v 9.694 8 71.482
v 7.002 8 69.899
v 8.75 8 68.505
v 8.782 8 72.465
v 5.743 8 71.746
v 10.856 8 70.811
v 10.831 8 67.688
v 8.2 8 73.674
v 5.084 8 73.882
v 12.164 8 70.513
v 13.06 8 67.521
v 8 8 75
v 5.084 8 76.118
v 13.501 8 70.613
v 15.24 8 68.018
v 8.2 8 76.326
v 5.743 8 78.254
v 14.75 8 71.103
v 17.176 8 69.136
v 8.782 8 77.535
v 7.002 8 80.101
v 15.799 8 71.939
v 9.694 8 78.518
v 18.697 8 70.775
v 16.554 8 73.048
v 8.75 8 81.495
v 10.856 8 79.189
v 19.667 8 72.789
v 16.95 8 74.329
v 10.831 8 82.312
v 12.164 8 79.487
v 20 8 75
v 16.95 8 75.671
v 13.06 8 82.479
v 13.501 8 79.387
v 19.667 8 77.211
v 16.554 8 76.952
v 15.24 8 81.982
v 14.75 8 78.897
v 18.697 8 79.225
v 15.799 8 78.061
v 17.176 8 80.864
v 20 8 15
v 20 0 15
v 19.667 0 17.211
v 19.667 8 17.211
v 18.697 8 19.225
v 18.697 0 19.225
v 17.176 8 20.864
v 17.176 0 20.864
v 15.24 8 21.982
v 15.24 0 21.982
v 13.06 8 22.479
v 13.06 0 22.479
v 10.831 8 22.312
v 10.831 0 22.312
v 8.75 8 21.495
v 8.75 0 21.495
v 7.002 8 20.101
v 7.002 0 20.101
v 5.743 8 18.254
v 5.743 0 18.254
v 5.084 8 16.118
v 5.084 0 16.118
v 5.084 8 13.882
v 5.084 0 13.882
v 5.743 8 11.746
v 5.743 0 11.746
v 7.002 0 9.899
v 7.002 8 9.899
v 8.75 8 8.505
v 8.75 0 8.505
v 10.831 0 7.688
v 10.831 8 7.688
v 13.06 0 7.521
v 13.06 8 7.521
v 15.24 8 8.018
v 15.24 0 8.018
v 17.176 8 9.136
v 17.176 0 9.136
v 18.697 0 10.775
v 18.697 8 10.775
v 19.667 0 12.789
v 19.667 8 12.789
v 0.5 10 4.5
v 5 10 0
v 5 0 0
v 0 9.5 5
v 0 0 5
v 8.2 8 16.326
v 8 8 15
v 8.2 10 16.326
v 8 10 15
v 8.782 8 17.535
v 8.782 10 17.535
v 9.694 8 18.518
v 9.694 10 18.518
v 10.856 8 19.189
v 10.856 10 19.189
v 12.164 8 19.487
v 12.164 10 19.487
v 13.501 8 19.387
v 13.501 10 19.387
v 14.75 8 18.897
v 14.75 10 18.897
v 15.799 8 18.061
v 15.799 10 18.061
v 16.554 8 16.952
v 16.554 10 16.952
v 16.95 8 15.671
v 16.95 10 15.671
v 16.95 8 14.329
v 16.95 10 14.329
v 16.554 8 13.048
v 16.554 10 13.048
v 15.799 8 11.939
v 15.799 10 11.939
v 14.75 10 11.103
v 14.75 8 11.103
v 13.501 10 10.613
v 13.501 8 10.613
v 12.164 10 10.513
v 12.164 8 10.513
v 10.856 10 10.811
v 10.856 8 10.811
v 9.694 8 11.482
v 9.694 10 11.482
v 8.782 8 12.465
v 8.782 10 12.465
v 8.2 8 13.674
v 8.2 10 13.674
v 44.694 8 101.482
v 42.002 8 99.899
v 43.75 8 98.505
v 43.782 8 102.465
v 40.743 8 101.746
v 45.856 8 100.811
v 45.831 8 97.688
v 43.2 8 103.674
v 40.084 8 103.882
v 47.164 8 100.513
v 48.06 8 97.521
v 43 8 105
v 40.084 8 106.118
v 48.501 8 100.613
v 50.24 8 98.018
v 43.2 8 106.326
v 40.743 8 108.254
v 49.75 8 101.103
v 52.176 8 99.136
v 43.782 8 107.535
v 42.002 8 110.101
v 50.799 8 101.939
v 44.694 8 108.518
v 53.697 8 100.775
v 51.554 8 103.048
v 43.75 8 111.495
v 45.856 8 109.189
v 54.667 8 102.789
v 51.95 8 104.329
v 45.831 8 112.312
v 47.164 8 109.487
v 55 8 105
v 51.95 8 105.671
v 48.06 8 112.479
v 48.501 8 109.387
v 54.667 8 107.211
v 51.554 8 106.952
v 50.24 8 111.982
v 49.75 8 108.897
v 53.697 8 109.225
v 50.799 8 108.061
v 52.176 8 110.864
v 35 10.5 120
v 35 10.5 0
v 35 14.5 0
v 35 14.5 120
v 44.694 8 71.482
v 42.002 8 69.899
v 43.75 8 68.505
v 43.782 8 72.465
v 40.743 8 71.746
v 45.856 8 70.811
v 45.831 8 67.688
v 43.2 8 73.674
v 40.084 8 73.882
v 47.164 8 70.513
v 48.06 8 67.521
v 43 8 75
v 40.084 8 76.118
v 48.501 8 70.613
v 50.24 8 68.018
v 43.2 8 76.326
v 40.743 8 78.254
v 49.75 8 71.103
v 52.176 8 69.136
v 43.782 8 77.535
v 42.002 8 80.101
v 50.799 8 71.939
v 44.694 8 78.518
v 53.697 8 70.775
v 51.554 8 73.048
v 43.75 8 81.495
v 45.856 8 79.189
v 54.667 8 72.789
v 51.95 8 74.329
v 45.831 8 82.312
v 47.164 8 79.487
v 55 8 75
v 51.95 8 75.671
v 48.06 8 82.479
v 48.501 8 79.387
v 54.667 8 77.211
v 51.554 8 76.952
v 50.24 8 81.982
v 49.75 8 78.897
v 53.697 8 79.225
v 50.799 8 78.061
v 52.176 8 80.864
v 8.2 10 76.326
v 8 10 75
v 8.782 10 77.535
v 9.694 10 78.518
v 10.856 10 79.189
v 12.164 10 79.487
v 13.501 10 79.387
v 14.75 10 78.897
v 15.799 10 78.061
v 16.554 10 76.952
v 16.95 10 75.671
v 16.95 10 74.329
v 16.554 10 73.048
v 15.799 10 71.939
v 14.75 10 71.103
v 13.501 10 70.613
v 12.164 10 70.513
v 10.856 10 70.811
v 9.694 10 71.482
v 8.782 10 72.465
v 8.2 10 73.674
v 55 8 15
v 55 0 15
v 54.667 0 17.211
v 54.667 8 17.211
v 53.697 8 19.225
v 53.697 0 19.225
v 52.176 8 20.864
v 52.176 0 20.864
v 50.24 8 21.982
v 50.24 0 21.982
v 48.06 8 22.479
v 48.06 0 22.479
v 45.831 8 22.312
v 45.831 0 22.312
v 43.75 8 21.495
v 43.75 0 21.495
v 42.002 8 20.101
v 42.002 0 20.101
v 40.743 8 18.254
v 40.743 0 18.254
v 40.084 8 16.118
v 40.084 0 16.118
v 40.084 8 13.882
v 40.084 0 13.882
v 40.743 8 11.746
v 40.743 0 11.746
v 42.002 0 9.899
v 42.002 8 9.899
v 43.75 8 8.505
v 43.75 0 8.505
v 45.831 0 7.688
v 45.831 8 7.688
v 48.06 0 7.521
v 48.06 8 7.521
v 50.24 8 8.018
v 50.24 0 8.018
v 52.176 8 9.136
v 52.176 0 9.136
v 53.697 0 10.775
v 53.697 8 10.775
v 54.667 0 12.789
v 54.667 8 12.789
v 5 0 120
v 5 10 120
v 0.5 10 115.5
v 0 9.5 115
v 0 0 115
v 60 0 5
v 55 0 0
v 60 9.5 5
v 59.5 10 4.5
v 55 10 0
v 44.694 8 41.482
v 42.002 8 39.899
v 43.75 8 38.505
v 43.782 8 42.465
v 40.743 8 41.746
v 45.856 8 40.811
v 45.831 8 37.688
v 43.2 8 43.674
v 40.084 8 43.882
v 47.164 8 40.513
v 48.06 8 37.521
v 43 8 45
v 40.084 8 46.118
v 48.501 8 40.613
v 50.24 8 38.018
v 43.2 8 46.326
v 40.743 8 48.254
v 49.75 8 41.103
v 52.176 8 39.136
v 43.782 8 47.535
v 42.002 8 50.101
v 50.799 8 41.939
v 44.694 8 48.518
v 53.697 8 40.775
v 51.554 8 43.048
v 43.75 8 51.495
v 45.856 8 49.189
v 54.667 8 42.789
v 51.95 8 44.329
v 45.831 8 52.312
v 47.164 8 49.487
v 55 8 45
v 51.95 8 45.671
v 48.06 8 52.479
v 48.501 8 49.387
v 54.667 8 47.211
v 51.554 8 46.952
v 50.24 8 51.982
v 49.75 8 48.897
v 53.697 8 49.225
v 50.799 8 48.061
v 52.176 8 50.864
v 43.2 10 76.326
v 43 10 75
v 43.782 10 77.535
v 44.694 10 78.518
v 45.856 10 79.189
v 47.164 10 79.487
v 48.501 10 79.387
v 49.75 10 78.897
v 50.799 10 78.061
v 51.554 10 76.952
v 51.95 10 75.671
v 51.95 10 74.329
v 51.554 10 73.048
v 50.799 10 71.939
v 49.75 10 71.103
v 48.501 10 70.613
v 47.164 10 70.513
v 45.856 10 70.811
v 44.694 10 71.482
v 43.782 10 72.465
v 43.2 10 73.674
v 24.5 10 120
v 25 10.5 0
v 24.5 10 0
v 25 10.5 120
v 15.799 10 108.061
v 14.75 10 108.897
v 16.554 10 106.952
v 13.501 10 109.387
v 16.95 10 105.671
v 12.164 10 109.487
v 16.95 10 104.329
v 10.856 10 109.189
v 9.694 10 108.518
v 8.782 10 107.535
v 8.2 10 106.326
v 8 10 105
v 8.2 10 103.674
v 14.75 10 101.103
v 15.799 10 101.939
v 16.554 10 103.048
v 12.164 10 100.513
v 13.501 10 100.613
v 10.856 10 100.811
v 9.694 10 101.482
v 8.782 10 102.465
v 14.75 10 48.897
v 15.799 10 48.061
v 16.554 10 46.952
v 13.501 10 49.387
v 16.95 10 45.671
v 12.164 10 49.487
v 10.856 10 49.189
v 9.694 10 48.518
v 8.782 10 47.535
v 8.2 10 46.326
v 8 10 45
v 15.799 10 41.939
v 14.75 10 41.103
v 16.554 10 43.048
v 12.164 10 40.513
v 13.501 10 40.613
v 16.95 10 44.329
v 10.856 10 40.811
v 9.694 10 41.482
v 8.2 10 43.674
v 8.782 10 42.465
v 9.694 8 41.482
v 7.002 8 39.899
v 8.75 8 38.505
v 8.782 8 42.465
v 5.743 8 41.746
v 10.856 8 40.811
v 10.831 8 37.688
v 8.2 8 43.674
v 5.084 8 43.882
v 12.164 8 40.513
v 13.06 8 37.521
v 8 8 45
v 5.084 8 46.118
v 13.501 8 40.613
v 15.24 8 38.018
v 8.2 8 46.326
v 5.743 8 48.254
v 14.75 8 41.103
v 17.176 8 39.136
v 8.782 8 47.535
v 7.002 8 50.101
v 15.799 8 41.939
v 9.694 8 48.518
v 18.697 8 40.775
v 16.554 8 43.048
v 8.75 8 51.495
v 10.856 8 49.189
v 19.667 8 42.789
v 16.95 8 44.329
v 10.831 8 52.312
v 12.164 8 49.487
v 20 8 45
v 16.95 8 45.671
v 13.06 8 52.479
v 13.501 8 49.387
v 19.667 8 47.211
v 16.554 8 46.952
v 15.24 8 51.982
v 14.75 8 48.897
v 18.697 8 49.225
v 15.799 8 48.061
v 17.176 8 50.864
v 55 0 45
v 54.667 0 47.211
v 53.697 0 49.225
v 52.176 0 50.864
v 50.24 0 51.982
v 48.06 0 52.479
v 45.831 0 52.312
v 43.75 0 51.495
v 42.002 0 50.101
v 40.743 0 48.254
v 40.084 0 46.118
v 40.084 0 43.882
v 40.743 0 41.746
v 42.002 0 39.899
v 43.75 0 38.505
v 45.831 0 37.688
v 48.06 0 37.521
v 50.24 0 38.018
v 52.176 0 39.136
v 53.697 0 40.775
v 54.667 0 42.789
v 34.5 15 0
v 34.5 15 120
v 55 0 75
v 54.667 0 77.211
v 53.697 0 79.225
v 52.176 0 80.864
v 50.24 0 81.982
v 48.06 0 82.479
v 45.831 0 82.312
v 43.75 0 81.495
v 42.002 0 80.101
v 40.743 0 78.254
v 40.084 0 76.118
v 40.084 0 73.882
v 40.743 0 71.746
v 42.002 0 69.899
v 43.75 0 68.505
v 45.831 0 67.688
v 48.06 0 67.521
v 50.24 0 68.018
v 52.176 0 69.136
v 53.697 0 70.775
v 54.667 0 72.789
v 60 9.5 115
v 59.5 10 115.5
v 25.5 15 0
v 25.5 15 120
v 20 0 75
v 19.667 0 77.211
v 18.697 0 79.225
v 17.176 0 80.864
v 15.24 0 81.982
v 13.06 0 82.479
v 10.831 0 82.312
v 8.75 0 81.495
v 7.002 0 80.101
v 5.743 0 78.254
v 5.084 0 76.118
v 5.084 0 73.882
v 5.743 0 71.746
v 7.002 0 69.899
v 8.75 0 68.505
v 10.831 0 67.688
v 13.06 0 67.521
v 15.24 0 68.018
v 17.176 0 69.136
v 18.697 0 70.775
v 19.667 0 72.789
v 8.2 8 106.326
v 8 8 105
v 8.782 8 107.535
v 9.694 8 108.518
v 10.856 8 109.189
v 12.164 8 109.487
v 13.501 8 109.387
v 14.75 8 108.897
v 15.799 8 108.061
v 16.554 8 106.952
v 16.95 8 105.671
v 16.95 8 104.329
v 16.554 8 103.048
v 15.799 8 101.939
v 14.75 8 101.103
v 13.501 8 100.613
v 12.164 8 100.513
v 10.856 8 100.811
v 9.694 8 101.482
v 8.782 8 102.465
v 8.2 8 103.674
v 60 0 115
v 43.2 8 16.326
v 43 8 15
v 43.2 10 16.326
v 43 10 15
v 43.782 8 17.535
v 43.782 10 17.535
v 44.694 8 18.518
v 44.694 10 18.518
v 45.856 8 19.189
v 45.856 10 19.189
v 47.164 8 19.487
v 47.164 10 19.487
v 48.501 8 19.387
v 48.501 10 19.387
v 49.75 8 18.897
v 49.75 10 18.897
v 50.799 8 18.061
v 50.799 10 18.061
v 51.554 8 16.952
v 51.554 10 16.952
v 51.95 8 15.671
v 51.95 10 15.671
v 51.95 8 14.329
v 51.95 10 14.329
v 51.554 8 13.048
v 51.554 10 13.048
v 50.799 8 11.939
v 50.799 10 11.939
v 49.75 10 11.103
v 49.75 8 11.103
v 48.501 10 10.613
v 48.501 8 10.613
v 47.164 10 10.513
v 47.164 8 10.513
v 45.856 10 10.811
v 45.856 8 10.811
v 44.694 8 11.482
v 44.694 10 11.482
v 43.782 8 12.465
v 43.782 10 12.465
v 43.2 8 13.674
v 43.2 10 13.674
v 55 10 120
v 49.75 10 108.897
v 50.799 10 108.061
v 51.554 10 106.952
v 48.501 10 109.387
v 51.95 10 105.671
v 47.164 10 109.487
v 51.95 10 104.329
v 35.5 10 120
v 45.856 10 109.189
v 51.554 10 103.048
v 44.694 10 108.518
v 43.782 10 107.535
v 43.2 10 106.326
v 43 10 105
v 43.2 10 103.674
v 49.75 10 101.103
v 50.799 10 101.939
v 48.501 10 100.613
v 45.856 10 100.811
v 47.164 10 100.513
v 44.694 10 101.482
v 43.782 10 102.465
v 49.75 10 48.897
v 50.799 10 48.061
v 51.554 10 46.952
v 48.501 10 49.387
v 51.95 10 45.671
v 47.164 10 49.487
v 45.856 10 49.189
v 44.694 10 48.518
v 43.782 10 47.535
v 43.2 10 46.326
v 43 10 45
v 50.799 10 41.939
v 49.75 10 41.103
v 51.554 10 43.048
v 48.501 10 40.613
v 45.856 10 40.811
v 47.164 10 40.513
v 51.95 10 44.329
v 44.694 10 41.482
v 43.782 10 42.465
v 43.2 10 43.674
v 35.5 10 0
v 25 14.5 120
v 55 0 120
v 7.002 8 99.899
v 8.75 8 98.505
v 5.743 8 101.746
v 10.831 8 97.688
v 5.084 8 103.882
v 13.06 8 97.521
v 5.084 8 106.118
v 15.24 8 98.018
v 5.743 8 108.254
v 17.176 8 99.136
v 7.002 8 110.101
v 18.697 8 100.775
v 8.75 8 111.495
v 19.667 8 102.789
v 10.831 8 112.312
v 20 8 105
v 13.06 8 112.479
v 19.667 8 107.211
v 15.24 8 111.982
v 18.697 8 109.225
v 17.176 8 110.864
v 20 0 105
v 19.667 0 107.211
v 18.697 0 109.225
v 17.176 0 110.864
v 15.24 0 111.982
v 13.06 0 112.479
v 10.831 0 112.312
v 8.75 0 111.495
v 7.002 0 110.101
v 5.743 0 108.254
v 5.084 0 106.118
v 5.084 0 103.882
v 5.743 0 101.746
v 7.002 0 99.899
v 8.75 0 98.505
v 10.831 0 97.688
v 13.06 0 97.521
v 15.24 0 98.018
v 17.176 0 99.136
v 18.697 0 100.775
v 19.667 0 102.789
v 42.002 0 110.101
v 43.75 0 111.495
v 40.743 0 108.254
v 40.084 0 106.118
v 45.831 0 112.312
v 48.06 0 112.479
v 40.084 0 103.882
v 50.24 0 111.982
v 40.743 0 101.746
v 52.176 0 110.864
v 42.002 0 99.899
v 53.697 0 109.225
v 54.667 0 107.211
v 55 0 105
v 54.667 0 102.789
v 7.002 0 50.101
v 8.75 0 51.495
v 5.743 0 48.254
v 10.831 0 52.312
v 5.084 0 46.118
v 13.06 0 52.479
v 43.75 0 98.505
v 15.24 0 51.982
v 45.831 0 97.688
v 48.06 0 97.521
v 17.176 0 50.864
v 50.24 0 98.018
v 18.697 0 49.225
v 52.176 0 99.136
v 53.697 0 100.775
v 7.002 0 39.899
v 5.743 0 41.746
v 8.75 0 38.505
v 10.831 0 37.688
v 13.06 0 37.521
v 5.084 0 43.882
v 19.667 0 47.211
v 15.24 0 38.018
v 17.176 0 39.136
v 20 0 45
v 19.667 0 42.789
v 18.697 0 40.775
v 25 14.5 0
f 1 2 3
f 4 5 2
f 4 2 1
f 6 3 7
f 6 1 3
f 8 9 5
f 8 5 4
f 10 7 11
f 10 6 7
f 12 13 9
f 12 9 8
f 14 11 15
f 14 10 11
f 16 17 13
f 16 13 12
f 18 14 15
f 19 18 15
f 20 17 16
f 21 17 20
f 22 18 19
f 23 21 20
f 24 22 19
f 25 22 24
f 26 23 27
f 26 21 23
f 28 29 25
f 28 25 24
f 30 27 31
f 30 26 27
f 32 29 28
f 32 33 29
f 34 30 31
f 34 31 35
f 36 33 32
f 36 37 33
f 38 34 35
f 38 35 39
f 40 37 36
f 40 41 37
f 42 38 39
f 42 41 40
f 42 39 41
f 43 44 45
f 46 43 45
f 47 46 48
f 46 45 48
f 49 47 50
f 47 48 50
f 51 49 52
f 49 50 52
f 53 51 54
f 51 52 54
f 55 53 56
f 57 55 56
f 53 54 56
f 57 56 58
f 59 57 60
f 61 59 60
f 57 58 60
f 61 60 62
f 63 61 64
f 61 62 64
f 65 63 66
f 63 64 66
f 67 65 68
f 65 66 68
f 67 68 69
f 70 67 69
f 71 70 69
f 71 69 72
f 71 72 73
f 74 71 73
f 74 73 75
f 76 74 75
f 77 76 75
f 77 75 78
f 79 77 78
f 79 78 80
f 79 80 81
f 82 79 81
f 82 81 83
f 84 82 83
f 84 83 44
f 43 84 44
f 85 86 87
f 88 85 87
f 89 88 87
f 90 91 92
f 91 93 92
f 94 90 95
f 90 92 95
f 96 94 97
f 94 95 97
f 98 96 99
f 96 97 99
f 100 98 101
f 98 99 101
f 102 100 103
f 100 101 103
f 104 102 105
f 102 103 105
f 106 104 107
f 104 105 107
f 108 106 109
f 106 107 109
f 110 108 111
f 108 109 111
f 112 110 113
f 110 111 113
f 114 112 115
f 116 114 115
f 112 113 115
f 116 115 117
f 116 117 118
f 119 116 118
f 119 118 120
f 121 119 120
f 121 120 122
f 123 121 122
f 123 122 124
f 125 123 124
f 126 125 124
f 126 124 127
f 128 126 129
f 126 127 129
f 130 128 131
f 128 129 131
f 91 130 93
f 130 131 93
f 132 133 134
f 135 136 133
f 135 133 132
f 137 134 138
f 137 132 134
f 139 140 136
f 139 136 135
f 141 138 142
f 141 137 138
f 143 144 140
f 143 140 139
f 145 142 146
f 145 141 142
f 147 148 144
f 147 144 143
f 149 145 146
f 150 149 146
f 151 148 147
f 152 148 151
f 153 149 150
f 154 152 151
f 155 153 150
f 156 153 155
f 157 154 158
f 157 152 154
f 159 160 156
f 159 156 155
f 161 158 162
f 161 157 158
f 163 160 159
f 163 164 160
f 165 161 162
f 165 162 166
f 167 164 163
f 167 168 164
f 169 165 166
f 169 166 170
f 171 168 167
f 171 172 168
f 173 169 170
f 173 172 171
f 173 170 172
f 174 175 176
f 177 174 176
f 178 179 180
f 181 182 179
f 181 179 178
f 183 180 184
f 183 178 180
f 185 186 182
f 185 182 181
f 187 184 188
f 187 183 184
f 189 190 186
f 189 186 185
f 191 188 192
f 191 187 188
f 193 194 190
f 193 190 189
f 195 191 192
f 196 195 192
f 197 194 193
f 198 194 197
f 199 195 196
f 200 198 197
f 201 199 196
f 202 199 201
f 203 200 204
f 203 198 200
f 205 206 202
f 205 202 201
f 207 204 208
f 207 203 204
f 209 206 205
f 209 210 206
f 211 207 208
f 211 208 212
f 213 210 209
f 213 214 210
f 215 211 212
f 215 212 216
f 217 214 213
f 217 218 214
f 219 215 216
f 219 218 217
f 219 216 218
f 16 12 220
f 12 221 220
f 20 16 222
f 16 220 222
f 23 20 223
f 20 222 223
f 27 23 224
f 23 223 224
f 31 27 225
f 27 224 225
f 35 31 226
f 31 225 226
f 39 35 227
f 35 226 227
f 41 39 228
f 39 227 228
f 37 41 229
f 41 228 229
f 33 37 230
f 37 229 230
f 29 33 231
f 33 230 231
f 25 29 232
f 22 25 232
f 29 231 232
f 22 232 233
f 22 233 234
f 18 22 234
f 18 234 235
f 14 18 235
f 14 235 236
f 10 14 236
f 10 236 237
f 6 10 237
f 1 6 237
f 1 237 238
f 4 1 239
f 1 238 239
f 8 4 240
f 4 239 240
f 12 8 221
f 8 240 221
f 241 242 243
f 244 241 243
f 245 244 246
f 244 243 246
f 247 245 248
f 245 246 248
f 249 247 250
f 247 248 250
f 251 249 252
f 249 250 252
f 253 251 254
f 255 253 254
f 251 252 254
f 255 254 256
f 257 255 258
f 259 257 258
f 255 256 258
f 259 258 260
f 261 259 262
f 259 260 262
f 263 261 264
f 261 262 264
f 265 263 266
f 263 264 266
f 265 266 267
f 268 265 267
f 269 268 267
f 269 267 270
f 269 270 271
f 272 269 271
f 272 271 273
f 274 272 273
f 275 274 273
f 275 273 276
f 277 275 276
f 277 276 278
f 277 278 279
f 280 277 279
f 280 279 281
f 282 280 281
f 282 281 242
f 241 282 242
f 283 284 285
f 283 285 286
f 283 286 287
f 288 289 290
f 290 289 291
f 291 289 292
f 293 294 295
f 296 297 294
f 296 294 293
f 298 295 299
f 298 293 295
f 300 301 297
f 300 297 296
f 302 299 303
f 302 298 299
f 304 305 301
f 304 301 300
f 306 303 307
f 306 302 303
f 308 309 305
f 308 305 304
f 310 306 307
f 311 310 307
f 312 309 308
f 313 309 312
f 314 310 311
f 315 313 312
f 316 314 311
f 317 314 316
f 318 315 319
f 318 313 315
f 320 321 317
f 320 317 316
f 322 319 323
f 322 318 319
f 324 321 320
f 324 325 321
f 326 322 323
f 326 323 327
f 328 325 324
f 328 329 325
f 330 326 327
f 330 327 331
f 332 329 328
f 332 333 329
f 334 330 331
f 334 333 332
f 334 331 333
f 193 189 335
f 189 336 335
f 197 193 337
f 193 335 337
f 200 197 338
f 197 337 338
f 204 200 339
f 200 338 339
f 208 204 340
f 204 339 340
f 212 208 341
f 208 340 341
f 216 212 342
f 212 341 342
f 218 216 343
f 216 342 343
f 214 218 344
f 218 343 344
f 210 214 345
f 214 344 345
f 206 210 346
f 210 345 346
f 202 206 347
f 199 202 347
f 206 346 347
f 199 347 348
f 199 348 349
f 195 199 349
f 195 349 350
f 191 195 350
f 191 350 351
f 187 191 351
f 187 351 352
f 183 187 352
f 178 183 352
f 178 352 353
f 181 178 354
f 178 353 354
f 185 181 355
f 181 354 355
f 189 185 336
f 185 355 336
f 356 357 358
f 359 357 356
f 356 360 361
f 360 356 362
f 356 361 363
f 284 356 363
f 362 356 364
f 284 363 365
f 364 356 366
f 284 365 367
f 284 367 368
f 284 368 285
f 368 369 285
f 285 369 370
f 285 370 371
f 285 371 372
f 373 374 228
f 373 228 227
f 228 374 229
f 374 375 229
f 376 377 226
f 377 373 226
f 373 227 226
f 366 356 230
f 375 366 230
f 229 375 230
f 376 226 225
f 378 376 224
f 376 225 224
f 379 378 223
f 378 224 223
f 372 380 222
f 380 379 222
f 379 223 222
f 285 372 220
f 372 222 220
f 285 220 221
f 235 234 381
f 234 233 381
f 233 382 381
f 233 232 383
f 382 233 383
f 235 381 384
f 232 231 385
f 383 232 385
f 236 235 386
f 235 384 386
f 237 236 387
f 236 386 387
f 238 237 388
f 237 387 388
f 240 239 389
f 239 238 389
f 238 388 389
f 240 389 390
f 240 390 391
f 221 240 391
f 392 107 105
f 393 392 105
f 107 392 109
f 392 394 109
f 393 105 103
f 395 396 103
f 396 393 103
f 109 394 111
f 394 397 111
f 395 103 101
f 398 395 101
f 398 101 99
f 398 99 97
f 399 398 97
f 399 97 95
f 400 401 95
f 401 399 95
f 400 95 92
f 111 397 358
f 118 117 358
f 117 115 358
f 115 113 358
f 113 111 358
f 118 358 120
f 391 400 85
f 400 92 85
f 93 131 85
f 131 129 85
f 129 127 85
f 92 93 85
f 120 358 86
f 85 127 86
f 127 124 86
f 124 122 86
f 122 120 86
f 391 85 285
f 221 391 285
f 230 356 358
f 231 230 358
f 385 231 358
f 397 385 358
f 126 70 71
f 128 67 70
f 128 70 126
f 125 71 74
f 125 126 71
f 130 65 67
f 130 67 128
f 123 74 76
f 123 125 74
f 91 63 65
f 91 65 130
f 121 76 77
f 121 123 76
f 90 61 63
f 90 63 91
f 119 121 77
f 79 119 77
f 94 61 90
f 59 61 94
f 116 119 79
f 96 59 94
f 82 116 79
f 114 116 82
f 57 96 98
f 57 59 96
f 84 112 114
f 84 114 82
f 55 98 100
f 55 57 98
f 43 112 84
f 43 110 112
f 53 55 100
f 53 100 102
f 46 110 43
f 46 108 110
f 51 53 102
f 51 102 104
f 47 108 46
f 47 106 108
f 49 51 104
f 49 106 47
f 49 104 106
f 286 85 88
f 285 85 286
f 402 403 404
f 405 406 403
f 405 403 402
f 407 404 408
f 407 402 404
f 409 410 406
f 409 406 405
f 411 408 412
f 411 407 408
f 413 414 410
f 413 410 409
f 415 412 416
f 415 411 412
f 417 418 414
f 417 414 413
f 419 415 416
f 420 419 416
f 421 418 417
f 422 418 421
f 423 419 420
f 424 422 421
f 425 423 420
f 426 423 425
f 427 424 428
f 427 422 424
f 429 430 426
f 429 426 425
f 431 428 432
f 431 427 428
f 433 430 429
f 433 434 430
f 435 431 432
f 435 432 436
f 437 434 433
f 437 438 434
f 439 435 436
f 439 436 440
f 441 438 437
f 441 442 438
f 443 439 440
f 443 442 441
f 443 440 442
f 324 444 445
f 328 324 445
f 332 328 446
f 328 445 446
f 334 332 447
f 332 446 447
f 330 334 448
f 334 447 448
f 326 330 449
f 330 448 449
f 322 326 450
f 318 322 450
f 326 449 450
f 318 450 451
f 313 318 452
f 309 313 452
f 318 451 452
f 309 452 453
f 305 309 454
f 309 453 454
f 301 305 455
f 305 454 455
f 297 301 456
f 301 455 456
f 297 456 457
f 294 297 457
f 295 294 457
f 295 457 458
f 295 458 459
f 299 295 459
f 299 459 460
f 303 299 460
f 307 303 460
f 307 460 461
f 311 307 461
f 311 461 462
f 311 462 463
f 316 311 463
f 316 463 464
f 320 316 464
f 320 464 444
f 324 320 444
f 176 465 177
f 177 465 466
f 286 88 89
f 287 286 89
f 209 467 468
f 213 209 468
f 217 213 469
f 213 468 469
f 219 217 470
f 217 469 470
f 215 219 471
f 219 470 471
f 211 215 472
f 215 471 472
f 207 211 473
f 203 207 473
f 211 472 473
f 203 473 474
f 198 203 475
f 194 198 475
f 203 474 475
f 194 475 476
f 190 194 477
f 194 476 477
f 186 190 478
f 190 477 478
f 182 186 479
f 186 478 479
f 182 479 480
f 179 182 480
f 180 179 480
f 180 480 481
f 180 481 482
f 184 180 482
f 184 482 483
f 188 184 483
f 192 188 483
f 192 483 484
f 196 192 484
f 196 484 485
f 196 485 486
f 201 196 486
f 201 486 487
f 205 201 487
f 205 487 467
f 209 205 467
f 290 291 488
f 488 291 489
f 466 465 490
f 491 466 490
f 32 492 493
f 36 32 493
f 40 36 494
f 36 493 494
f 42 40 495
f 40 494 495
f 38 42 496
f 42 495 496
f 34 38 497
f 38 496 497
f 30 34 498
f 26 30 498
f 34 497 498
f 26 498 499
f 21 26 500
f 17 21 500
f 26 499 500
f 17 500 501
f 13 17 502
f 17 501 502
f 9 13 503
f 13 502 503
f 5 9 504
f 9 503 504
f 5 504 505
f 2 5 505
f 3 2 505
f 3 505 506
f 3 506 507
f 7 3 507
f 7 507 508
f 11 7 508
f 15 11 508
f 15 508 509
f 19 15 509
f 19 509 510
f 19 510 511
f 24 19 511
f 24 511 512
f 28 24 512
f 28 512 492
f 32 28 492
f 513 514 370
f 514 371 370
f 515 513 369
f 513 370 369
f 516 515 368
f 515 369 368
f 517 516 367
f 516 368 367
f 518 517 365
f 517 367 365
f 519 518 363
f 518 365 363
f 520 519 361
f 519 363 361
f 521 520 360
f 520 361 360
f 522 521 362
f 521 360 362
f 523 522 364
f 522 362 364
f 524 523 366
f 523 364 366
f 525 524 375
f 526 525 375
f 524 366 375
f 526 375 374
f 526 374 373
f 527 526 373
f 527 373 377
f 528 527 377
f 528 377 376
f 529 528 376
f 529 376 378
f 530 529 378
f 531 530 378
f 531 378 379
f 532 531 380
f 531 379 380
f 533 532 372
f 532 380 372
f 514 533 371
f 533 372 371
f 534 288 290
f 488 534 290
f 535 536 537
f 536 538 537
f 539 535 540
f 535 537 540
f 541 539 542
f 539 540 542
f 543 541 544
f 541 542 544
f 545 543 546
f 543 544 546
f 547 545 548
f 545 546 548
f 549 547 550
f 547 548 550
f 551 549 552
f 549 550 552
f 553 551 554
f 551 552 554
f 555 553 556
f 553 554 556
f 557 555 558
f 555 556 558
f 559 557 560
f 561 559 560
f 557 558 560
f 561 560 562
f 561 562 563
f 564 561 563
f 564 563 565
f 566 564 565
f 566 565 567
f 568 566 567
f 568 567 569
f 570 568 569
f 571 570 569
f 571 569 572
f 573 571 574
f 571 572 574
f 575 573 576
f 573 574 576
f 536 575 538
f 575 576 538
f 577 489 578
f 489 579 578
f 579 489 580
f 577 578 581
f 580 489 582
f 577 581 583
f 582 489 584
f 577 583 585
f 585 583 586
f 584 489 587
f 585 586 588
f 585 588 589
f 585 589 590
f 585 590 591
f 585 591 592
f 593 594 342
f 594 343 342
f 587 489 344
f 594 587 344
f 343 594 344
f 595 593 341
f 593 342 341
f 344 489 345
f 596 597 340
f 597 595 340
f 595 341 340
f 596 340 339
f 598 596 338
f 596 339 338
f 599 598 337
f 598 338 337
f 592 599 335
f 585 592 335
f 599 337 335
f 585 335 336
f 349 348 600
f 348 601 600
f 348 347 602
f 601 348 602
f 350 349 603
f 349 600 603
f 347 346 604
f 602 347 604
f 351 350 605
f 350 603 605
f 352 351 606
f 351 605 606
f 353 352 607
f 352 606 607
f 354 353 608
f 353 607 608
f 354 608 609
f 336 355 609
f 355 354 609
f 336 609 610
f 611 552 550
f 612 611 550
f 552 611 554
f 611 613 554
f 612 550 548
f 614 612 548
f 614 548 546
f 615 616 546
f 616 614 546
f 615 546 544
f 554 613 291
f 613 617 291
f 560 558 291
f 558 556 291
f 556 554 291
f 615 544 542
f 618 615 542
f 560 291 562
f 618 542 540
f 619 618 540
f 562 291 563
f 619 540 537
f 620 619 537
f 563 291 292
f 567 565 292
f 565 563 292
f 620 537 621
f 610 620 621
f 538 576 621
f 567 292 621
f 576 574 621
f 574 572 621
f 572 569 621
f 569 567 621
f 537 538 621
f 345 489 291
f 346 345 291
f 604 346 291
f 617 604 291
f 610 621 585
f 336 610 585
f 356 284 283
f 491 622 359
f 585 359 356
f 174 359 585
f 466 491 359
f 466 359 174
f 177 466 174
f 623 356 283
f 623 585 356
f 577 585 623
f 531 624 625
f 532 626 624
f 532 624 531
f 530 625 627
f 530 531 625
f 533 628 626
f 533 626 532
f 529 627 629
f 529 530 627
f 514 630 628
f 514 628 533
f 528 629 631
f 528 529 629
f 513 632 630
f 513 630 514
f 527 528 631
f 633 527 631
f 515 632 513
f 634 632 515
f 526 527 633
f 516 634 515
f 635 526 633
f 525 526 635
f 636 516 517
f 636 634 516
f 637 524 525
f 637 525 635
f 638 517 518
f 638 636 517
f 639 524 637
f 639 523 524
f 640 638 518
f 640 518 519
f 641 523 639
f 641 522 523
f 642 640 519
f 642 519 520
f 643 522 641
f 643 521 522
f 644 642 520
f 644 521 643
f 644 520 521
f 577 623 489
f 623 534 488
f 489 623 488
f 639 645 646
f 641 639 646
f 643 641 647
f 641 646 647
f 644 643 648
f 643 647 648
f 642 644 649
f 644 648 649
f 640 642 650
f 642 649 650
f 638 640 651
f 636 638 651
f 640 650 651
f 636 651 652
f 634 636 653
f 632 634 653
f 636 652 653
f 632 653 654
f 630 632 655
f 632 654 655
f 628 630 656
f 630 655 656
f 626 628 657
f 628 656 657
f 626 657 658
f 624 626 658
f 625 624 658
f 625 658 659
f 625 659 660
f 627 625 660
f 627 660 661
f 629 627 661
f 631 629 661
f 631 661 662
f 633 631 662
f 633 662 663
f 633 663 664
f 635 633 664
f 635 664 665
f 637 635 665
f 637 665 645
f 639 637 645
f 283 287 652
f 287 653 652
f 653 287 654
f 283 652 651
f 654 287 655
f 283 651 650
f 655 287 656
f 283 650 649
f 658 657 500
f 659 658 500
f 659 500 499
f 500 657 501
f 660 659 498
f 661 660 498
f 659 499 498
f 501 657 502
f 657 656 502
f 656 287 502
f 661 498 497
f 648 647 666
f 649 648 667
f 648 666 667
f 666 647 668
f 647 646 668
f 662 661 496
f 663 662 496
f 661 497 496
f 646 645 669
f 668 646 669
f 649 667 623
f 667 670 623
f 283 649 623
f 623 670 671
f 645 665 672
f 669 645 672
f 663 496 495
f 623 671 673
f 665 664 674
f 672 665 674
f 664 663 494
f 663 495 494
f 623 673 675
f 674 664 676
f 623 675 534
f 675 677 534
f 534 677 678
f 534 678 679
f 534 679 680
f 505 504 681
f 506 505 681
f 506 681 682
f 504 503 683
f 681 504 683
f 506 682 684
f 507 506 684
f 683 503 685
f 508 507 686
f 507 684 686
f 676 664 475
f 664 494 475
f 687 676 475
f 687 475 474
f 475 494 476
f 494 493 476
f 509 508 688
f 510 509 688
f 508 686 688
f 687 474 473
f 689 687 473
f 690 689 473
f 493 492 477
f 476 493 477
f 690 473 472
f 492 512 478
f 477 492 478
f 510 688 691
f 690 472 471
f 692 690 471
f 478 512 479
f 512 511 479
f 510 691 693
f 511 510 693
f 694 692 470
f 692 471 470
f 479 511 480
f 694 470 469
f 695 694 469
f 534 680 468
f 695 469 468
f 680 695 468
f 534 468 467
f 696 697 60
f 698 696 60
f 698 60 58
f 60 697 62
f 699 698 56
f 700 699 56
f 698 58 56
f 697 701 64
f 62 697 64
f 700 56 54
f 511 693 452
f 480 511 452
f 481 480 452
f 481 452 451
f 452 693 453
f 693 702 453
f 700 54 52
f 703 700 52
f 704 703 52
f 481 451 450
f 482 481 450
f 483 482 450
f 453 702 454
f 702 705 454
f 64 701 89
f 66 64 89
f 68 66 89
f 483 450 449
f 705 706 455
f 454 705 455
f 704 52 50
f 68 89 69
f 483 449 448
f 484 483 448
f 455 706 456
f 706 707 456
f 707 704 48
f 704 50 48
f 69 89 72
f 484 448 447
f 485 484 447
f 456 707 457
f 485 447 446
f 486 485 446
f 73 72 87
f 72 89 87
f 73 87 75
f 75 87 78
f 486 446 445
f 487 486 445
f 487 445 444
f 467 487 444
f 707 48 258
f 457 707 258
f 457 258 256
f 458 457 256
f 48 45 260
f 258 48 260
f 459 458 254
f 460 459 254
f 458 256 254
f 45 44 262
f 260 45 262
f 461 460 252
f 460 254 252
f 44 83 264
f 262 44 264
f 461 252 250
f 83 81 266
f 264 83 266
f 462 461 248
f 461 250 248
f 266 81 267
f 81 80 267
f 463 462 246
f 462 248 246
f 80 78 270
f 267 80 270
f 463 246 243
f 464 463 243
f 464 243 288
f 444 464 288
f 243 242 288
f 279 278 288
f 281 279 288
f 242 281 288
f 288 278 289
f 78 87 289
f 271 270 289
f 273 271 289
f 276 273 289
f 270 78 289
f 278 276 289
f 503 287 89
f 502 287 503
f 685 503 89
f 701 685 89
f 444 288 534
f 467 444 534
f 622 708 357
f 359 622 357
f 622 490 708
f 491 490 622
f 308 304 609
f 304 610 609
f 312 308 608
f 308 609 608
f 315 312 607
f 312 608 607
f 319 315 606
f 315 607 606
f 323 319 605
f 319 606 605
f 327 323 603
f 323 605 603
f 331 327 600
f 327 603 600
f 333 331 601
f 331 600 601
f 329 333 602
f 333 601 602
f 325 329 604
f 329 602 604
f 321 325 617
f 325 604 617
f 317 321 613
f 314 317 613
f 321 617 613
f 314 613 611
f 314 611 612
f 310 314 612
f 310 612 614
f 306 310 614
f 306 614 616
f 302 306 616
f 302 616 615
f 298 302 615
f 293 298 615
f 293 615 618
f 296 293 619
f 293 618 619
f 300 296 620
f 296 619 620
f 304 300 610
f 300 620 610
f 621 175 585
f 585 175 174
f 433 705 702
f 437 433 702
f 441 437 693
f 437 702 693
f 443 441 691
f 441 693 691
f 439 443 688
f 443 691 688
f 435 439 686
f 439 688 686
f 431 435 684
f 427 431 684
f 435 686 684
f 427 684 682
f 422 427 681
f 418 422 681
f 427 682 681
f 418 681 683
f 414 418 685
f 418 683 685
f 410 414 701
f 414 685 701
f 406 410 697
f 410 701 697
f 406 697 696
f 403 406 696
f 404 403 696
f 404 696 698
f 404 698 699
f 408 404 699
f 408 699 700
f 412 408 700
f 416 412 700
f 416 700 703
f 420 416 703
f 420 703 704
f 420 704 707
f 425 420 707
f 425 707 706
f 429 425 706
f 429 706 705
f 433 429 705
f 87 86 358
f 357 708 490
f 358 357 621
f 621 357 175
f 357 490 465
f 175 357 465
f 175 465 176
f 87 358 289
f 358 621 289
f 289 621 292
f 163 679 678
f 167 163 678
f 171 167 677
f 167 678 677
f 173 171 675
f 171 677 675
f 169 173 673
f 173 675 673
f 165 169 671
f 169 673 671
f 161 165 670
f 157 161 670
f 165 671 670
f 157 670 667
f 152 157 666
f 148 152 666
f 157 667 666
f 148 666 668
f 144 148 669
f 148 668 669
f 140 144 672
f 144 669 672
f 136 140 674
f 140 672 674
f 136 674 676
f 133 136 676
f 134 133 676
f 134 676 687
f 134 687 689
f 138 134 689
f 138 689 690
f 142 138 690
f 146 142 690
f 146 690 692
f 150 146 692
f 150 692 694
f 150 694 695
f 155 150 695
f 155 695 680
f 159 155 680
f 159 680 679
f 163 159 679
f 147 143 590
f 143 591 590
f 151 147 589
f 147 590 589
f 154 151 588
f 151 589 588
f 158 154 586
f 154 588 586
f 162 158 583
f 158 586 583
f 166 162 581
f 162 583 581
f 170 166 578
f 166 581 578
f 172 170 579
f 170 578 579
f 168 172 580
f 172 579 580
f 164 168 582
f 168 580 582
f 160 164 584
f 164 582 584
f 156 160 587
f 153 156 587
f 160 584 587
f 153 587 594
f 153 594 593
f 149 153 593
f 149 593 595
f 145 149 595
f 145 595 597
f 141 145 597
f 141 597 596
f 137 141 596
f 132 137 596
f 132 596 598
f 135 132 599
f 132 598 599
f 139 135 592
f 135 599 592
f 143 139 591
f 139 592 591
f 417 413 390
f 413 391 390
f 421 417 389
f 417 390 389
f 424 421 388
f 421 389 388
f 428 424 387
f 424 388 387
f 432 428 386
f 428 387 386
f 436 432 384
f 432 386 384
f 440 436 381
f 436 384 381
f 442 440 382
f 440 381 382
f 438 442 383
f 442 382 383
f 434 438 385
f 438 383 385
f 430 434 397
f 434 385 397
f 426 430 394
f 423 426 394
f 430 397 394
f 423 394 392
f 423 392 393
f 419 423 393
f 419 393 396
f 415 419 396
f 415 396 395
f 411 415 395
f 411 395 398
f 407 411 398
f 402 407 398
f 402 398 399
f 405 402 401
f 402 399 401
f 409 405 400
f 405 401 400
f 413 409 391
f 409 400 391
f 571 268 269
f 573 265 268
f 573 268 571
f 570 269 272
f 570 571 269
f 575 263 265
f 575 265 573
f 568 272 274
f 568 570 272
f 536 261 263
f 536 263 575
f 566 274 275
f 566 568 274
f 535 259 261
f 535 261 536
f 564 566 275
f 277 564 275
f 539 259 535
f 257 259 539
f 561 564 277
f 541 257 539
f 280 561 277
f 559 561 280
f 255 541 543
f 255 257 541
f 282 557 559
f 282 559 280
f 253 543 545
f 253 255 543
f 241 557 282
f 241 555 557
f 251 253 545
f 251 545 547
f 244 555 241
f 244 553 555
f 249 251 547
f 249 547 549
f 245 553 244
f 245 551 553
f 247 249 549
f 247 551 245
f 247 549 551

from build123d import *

# Parameters (mm, degrees)
F1_DEPTH       = 120
F3_D           = 9
F3_DEPTH       = 10
F3_CBORE_D     = 15
F3_CBORE_DEPTH = 8
F3_TIP         = 2.7038727856
F4_SIZE        = 5
F5_SIZE        = 0.5


with BuildPart() as f1:
    # F0 (on Top) → F1 (new body)
    with BuildSketch(Plane.XY):
        Polygon((0, 10), (0, 0), (60, 0), (60, 10), (35, 10), (35, 15), (25, 15), (25, 10), align=None)
    extrude(amount=F1_DEPTH)

    # F3
    with Locations(Plane.XZ):
        with Locations((47.5, 45), (47.5, 75), (12.5, 15), (12.5, 105), (47.5, 15), (12.5, 75), (47.5, 105), (12.5, 45)):
            CounterBoreHole(F3_D / 2, F3_CBORE_D / 2, F3_CBORE_DEPTH, depth=F3_DEPTH)
            with Locations((0, 0, -(F3_DEPTH + F3_TIP / 2))):  # 118° drill point
                Cone(0, F3_D / 2, F3_TIP, mode=Mode.SUBTRACT)

    # F4
    f4_edges = [f1.edges().sort_by_distance(p)[0] for p in [
        (0, 5, 120),
        (60, 5, 120),
        (60, 5, 0),
        (0, 5, 0),
    ]]
    chamfer(f4_edges, length=F4_SIZE)

    # F5
    f5_edges = [f1.edges().sort_by_distance(p)[0] for p in [
        (35, 15, 60),
        (25, 15, 60),
        (0, 10, 60),
        (60, 10, 60),
        (35, 10, 60),
        (25, 10, 60),
    ]]
    chamfer(f5_edges, length=F5_SIZE)


solid = f1.part
